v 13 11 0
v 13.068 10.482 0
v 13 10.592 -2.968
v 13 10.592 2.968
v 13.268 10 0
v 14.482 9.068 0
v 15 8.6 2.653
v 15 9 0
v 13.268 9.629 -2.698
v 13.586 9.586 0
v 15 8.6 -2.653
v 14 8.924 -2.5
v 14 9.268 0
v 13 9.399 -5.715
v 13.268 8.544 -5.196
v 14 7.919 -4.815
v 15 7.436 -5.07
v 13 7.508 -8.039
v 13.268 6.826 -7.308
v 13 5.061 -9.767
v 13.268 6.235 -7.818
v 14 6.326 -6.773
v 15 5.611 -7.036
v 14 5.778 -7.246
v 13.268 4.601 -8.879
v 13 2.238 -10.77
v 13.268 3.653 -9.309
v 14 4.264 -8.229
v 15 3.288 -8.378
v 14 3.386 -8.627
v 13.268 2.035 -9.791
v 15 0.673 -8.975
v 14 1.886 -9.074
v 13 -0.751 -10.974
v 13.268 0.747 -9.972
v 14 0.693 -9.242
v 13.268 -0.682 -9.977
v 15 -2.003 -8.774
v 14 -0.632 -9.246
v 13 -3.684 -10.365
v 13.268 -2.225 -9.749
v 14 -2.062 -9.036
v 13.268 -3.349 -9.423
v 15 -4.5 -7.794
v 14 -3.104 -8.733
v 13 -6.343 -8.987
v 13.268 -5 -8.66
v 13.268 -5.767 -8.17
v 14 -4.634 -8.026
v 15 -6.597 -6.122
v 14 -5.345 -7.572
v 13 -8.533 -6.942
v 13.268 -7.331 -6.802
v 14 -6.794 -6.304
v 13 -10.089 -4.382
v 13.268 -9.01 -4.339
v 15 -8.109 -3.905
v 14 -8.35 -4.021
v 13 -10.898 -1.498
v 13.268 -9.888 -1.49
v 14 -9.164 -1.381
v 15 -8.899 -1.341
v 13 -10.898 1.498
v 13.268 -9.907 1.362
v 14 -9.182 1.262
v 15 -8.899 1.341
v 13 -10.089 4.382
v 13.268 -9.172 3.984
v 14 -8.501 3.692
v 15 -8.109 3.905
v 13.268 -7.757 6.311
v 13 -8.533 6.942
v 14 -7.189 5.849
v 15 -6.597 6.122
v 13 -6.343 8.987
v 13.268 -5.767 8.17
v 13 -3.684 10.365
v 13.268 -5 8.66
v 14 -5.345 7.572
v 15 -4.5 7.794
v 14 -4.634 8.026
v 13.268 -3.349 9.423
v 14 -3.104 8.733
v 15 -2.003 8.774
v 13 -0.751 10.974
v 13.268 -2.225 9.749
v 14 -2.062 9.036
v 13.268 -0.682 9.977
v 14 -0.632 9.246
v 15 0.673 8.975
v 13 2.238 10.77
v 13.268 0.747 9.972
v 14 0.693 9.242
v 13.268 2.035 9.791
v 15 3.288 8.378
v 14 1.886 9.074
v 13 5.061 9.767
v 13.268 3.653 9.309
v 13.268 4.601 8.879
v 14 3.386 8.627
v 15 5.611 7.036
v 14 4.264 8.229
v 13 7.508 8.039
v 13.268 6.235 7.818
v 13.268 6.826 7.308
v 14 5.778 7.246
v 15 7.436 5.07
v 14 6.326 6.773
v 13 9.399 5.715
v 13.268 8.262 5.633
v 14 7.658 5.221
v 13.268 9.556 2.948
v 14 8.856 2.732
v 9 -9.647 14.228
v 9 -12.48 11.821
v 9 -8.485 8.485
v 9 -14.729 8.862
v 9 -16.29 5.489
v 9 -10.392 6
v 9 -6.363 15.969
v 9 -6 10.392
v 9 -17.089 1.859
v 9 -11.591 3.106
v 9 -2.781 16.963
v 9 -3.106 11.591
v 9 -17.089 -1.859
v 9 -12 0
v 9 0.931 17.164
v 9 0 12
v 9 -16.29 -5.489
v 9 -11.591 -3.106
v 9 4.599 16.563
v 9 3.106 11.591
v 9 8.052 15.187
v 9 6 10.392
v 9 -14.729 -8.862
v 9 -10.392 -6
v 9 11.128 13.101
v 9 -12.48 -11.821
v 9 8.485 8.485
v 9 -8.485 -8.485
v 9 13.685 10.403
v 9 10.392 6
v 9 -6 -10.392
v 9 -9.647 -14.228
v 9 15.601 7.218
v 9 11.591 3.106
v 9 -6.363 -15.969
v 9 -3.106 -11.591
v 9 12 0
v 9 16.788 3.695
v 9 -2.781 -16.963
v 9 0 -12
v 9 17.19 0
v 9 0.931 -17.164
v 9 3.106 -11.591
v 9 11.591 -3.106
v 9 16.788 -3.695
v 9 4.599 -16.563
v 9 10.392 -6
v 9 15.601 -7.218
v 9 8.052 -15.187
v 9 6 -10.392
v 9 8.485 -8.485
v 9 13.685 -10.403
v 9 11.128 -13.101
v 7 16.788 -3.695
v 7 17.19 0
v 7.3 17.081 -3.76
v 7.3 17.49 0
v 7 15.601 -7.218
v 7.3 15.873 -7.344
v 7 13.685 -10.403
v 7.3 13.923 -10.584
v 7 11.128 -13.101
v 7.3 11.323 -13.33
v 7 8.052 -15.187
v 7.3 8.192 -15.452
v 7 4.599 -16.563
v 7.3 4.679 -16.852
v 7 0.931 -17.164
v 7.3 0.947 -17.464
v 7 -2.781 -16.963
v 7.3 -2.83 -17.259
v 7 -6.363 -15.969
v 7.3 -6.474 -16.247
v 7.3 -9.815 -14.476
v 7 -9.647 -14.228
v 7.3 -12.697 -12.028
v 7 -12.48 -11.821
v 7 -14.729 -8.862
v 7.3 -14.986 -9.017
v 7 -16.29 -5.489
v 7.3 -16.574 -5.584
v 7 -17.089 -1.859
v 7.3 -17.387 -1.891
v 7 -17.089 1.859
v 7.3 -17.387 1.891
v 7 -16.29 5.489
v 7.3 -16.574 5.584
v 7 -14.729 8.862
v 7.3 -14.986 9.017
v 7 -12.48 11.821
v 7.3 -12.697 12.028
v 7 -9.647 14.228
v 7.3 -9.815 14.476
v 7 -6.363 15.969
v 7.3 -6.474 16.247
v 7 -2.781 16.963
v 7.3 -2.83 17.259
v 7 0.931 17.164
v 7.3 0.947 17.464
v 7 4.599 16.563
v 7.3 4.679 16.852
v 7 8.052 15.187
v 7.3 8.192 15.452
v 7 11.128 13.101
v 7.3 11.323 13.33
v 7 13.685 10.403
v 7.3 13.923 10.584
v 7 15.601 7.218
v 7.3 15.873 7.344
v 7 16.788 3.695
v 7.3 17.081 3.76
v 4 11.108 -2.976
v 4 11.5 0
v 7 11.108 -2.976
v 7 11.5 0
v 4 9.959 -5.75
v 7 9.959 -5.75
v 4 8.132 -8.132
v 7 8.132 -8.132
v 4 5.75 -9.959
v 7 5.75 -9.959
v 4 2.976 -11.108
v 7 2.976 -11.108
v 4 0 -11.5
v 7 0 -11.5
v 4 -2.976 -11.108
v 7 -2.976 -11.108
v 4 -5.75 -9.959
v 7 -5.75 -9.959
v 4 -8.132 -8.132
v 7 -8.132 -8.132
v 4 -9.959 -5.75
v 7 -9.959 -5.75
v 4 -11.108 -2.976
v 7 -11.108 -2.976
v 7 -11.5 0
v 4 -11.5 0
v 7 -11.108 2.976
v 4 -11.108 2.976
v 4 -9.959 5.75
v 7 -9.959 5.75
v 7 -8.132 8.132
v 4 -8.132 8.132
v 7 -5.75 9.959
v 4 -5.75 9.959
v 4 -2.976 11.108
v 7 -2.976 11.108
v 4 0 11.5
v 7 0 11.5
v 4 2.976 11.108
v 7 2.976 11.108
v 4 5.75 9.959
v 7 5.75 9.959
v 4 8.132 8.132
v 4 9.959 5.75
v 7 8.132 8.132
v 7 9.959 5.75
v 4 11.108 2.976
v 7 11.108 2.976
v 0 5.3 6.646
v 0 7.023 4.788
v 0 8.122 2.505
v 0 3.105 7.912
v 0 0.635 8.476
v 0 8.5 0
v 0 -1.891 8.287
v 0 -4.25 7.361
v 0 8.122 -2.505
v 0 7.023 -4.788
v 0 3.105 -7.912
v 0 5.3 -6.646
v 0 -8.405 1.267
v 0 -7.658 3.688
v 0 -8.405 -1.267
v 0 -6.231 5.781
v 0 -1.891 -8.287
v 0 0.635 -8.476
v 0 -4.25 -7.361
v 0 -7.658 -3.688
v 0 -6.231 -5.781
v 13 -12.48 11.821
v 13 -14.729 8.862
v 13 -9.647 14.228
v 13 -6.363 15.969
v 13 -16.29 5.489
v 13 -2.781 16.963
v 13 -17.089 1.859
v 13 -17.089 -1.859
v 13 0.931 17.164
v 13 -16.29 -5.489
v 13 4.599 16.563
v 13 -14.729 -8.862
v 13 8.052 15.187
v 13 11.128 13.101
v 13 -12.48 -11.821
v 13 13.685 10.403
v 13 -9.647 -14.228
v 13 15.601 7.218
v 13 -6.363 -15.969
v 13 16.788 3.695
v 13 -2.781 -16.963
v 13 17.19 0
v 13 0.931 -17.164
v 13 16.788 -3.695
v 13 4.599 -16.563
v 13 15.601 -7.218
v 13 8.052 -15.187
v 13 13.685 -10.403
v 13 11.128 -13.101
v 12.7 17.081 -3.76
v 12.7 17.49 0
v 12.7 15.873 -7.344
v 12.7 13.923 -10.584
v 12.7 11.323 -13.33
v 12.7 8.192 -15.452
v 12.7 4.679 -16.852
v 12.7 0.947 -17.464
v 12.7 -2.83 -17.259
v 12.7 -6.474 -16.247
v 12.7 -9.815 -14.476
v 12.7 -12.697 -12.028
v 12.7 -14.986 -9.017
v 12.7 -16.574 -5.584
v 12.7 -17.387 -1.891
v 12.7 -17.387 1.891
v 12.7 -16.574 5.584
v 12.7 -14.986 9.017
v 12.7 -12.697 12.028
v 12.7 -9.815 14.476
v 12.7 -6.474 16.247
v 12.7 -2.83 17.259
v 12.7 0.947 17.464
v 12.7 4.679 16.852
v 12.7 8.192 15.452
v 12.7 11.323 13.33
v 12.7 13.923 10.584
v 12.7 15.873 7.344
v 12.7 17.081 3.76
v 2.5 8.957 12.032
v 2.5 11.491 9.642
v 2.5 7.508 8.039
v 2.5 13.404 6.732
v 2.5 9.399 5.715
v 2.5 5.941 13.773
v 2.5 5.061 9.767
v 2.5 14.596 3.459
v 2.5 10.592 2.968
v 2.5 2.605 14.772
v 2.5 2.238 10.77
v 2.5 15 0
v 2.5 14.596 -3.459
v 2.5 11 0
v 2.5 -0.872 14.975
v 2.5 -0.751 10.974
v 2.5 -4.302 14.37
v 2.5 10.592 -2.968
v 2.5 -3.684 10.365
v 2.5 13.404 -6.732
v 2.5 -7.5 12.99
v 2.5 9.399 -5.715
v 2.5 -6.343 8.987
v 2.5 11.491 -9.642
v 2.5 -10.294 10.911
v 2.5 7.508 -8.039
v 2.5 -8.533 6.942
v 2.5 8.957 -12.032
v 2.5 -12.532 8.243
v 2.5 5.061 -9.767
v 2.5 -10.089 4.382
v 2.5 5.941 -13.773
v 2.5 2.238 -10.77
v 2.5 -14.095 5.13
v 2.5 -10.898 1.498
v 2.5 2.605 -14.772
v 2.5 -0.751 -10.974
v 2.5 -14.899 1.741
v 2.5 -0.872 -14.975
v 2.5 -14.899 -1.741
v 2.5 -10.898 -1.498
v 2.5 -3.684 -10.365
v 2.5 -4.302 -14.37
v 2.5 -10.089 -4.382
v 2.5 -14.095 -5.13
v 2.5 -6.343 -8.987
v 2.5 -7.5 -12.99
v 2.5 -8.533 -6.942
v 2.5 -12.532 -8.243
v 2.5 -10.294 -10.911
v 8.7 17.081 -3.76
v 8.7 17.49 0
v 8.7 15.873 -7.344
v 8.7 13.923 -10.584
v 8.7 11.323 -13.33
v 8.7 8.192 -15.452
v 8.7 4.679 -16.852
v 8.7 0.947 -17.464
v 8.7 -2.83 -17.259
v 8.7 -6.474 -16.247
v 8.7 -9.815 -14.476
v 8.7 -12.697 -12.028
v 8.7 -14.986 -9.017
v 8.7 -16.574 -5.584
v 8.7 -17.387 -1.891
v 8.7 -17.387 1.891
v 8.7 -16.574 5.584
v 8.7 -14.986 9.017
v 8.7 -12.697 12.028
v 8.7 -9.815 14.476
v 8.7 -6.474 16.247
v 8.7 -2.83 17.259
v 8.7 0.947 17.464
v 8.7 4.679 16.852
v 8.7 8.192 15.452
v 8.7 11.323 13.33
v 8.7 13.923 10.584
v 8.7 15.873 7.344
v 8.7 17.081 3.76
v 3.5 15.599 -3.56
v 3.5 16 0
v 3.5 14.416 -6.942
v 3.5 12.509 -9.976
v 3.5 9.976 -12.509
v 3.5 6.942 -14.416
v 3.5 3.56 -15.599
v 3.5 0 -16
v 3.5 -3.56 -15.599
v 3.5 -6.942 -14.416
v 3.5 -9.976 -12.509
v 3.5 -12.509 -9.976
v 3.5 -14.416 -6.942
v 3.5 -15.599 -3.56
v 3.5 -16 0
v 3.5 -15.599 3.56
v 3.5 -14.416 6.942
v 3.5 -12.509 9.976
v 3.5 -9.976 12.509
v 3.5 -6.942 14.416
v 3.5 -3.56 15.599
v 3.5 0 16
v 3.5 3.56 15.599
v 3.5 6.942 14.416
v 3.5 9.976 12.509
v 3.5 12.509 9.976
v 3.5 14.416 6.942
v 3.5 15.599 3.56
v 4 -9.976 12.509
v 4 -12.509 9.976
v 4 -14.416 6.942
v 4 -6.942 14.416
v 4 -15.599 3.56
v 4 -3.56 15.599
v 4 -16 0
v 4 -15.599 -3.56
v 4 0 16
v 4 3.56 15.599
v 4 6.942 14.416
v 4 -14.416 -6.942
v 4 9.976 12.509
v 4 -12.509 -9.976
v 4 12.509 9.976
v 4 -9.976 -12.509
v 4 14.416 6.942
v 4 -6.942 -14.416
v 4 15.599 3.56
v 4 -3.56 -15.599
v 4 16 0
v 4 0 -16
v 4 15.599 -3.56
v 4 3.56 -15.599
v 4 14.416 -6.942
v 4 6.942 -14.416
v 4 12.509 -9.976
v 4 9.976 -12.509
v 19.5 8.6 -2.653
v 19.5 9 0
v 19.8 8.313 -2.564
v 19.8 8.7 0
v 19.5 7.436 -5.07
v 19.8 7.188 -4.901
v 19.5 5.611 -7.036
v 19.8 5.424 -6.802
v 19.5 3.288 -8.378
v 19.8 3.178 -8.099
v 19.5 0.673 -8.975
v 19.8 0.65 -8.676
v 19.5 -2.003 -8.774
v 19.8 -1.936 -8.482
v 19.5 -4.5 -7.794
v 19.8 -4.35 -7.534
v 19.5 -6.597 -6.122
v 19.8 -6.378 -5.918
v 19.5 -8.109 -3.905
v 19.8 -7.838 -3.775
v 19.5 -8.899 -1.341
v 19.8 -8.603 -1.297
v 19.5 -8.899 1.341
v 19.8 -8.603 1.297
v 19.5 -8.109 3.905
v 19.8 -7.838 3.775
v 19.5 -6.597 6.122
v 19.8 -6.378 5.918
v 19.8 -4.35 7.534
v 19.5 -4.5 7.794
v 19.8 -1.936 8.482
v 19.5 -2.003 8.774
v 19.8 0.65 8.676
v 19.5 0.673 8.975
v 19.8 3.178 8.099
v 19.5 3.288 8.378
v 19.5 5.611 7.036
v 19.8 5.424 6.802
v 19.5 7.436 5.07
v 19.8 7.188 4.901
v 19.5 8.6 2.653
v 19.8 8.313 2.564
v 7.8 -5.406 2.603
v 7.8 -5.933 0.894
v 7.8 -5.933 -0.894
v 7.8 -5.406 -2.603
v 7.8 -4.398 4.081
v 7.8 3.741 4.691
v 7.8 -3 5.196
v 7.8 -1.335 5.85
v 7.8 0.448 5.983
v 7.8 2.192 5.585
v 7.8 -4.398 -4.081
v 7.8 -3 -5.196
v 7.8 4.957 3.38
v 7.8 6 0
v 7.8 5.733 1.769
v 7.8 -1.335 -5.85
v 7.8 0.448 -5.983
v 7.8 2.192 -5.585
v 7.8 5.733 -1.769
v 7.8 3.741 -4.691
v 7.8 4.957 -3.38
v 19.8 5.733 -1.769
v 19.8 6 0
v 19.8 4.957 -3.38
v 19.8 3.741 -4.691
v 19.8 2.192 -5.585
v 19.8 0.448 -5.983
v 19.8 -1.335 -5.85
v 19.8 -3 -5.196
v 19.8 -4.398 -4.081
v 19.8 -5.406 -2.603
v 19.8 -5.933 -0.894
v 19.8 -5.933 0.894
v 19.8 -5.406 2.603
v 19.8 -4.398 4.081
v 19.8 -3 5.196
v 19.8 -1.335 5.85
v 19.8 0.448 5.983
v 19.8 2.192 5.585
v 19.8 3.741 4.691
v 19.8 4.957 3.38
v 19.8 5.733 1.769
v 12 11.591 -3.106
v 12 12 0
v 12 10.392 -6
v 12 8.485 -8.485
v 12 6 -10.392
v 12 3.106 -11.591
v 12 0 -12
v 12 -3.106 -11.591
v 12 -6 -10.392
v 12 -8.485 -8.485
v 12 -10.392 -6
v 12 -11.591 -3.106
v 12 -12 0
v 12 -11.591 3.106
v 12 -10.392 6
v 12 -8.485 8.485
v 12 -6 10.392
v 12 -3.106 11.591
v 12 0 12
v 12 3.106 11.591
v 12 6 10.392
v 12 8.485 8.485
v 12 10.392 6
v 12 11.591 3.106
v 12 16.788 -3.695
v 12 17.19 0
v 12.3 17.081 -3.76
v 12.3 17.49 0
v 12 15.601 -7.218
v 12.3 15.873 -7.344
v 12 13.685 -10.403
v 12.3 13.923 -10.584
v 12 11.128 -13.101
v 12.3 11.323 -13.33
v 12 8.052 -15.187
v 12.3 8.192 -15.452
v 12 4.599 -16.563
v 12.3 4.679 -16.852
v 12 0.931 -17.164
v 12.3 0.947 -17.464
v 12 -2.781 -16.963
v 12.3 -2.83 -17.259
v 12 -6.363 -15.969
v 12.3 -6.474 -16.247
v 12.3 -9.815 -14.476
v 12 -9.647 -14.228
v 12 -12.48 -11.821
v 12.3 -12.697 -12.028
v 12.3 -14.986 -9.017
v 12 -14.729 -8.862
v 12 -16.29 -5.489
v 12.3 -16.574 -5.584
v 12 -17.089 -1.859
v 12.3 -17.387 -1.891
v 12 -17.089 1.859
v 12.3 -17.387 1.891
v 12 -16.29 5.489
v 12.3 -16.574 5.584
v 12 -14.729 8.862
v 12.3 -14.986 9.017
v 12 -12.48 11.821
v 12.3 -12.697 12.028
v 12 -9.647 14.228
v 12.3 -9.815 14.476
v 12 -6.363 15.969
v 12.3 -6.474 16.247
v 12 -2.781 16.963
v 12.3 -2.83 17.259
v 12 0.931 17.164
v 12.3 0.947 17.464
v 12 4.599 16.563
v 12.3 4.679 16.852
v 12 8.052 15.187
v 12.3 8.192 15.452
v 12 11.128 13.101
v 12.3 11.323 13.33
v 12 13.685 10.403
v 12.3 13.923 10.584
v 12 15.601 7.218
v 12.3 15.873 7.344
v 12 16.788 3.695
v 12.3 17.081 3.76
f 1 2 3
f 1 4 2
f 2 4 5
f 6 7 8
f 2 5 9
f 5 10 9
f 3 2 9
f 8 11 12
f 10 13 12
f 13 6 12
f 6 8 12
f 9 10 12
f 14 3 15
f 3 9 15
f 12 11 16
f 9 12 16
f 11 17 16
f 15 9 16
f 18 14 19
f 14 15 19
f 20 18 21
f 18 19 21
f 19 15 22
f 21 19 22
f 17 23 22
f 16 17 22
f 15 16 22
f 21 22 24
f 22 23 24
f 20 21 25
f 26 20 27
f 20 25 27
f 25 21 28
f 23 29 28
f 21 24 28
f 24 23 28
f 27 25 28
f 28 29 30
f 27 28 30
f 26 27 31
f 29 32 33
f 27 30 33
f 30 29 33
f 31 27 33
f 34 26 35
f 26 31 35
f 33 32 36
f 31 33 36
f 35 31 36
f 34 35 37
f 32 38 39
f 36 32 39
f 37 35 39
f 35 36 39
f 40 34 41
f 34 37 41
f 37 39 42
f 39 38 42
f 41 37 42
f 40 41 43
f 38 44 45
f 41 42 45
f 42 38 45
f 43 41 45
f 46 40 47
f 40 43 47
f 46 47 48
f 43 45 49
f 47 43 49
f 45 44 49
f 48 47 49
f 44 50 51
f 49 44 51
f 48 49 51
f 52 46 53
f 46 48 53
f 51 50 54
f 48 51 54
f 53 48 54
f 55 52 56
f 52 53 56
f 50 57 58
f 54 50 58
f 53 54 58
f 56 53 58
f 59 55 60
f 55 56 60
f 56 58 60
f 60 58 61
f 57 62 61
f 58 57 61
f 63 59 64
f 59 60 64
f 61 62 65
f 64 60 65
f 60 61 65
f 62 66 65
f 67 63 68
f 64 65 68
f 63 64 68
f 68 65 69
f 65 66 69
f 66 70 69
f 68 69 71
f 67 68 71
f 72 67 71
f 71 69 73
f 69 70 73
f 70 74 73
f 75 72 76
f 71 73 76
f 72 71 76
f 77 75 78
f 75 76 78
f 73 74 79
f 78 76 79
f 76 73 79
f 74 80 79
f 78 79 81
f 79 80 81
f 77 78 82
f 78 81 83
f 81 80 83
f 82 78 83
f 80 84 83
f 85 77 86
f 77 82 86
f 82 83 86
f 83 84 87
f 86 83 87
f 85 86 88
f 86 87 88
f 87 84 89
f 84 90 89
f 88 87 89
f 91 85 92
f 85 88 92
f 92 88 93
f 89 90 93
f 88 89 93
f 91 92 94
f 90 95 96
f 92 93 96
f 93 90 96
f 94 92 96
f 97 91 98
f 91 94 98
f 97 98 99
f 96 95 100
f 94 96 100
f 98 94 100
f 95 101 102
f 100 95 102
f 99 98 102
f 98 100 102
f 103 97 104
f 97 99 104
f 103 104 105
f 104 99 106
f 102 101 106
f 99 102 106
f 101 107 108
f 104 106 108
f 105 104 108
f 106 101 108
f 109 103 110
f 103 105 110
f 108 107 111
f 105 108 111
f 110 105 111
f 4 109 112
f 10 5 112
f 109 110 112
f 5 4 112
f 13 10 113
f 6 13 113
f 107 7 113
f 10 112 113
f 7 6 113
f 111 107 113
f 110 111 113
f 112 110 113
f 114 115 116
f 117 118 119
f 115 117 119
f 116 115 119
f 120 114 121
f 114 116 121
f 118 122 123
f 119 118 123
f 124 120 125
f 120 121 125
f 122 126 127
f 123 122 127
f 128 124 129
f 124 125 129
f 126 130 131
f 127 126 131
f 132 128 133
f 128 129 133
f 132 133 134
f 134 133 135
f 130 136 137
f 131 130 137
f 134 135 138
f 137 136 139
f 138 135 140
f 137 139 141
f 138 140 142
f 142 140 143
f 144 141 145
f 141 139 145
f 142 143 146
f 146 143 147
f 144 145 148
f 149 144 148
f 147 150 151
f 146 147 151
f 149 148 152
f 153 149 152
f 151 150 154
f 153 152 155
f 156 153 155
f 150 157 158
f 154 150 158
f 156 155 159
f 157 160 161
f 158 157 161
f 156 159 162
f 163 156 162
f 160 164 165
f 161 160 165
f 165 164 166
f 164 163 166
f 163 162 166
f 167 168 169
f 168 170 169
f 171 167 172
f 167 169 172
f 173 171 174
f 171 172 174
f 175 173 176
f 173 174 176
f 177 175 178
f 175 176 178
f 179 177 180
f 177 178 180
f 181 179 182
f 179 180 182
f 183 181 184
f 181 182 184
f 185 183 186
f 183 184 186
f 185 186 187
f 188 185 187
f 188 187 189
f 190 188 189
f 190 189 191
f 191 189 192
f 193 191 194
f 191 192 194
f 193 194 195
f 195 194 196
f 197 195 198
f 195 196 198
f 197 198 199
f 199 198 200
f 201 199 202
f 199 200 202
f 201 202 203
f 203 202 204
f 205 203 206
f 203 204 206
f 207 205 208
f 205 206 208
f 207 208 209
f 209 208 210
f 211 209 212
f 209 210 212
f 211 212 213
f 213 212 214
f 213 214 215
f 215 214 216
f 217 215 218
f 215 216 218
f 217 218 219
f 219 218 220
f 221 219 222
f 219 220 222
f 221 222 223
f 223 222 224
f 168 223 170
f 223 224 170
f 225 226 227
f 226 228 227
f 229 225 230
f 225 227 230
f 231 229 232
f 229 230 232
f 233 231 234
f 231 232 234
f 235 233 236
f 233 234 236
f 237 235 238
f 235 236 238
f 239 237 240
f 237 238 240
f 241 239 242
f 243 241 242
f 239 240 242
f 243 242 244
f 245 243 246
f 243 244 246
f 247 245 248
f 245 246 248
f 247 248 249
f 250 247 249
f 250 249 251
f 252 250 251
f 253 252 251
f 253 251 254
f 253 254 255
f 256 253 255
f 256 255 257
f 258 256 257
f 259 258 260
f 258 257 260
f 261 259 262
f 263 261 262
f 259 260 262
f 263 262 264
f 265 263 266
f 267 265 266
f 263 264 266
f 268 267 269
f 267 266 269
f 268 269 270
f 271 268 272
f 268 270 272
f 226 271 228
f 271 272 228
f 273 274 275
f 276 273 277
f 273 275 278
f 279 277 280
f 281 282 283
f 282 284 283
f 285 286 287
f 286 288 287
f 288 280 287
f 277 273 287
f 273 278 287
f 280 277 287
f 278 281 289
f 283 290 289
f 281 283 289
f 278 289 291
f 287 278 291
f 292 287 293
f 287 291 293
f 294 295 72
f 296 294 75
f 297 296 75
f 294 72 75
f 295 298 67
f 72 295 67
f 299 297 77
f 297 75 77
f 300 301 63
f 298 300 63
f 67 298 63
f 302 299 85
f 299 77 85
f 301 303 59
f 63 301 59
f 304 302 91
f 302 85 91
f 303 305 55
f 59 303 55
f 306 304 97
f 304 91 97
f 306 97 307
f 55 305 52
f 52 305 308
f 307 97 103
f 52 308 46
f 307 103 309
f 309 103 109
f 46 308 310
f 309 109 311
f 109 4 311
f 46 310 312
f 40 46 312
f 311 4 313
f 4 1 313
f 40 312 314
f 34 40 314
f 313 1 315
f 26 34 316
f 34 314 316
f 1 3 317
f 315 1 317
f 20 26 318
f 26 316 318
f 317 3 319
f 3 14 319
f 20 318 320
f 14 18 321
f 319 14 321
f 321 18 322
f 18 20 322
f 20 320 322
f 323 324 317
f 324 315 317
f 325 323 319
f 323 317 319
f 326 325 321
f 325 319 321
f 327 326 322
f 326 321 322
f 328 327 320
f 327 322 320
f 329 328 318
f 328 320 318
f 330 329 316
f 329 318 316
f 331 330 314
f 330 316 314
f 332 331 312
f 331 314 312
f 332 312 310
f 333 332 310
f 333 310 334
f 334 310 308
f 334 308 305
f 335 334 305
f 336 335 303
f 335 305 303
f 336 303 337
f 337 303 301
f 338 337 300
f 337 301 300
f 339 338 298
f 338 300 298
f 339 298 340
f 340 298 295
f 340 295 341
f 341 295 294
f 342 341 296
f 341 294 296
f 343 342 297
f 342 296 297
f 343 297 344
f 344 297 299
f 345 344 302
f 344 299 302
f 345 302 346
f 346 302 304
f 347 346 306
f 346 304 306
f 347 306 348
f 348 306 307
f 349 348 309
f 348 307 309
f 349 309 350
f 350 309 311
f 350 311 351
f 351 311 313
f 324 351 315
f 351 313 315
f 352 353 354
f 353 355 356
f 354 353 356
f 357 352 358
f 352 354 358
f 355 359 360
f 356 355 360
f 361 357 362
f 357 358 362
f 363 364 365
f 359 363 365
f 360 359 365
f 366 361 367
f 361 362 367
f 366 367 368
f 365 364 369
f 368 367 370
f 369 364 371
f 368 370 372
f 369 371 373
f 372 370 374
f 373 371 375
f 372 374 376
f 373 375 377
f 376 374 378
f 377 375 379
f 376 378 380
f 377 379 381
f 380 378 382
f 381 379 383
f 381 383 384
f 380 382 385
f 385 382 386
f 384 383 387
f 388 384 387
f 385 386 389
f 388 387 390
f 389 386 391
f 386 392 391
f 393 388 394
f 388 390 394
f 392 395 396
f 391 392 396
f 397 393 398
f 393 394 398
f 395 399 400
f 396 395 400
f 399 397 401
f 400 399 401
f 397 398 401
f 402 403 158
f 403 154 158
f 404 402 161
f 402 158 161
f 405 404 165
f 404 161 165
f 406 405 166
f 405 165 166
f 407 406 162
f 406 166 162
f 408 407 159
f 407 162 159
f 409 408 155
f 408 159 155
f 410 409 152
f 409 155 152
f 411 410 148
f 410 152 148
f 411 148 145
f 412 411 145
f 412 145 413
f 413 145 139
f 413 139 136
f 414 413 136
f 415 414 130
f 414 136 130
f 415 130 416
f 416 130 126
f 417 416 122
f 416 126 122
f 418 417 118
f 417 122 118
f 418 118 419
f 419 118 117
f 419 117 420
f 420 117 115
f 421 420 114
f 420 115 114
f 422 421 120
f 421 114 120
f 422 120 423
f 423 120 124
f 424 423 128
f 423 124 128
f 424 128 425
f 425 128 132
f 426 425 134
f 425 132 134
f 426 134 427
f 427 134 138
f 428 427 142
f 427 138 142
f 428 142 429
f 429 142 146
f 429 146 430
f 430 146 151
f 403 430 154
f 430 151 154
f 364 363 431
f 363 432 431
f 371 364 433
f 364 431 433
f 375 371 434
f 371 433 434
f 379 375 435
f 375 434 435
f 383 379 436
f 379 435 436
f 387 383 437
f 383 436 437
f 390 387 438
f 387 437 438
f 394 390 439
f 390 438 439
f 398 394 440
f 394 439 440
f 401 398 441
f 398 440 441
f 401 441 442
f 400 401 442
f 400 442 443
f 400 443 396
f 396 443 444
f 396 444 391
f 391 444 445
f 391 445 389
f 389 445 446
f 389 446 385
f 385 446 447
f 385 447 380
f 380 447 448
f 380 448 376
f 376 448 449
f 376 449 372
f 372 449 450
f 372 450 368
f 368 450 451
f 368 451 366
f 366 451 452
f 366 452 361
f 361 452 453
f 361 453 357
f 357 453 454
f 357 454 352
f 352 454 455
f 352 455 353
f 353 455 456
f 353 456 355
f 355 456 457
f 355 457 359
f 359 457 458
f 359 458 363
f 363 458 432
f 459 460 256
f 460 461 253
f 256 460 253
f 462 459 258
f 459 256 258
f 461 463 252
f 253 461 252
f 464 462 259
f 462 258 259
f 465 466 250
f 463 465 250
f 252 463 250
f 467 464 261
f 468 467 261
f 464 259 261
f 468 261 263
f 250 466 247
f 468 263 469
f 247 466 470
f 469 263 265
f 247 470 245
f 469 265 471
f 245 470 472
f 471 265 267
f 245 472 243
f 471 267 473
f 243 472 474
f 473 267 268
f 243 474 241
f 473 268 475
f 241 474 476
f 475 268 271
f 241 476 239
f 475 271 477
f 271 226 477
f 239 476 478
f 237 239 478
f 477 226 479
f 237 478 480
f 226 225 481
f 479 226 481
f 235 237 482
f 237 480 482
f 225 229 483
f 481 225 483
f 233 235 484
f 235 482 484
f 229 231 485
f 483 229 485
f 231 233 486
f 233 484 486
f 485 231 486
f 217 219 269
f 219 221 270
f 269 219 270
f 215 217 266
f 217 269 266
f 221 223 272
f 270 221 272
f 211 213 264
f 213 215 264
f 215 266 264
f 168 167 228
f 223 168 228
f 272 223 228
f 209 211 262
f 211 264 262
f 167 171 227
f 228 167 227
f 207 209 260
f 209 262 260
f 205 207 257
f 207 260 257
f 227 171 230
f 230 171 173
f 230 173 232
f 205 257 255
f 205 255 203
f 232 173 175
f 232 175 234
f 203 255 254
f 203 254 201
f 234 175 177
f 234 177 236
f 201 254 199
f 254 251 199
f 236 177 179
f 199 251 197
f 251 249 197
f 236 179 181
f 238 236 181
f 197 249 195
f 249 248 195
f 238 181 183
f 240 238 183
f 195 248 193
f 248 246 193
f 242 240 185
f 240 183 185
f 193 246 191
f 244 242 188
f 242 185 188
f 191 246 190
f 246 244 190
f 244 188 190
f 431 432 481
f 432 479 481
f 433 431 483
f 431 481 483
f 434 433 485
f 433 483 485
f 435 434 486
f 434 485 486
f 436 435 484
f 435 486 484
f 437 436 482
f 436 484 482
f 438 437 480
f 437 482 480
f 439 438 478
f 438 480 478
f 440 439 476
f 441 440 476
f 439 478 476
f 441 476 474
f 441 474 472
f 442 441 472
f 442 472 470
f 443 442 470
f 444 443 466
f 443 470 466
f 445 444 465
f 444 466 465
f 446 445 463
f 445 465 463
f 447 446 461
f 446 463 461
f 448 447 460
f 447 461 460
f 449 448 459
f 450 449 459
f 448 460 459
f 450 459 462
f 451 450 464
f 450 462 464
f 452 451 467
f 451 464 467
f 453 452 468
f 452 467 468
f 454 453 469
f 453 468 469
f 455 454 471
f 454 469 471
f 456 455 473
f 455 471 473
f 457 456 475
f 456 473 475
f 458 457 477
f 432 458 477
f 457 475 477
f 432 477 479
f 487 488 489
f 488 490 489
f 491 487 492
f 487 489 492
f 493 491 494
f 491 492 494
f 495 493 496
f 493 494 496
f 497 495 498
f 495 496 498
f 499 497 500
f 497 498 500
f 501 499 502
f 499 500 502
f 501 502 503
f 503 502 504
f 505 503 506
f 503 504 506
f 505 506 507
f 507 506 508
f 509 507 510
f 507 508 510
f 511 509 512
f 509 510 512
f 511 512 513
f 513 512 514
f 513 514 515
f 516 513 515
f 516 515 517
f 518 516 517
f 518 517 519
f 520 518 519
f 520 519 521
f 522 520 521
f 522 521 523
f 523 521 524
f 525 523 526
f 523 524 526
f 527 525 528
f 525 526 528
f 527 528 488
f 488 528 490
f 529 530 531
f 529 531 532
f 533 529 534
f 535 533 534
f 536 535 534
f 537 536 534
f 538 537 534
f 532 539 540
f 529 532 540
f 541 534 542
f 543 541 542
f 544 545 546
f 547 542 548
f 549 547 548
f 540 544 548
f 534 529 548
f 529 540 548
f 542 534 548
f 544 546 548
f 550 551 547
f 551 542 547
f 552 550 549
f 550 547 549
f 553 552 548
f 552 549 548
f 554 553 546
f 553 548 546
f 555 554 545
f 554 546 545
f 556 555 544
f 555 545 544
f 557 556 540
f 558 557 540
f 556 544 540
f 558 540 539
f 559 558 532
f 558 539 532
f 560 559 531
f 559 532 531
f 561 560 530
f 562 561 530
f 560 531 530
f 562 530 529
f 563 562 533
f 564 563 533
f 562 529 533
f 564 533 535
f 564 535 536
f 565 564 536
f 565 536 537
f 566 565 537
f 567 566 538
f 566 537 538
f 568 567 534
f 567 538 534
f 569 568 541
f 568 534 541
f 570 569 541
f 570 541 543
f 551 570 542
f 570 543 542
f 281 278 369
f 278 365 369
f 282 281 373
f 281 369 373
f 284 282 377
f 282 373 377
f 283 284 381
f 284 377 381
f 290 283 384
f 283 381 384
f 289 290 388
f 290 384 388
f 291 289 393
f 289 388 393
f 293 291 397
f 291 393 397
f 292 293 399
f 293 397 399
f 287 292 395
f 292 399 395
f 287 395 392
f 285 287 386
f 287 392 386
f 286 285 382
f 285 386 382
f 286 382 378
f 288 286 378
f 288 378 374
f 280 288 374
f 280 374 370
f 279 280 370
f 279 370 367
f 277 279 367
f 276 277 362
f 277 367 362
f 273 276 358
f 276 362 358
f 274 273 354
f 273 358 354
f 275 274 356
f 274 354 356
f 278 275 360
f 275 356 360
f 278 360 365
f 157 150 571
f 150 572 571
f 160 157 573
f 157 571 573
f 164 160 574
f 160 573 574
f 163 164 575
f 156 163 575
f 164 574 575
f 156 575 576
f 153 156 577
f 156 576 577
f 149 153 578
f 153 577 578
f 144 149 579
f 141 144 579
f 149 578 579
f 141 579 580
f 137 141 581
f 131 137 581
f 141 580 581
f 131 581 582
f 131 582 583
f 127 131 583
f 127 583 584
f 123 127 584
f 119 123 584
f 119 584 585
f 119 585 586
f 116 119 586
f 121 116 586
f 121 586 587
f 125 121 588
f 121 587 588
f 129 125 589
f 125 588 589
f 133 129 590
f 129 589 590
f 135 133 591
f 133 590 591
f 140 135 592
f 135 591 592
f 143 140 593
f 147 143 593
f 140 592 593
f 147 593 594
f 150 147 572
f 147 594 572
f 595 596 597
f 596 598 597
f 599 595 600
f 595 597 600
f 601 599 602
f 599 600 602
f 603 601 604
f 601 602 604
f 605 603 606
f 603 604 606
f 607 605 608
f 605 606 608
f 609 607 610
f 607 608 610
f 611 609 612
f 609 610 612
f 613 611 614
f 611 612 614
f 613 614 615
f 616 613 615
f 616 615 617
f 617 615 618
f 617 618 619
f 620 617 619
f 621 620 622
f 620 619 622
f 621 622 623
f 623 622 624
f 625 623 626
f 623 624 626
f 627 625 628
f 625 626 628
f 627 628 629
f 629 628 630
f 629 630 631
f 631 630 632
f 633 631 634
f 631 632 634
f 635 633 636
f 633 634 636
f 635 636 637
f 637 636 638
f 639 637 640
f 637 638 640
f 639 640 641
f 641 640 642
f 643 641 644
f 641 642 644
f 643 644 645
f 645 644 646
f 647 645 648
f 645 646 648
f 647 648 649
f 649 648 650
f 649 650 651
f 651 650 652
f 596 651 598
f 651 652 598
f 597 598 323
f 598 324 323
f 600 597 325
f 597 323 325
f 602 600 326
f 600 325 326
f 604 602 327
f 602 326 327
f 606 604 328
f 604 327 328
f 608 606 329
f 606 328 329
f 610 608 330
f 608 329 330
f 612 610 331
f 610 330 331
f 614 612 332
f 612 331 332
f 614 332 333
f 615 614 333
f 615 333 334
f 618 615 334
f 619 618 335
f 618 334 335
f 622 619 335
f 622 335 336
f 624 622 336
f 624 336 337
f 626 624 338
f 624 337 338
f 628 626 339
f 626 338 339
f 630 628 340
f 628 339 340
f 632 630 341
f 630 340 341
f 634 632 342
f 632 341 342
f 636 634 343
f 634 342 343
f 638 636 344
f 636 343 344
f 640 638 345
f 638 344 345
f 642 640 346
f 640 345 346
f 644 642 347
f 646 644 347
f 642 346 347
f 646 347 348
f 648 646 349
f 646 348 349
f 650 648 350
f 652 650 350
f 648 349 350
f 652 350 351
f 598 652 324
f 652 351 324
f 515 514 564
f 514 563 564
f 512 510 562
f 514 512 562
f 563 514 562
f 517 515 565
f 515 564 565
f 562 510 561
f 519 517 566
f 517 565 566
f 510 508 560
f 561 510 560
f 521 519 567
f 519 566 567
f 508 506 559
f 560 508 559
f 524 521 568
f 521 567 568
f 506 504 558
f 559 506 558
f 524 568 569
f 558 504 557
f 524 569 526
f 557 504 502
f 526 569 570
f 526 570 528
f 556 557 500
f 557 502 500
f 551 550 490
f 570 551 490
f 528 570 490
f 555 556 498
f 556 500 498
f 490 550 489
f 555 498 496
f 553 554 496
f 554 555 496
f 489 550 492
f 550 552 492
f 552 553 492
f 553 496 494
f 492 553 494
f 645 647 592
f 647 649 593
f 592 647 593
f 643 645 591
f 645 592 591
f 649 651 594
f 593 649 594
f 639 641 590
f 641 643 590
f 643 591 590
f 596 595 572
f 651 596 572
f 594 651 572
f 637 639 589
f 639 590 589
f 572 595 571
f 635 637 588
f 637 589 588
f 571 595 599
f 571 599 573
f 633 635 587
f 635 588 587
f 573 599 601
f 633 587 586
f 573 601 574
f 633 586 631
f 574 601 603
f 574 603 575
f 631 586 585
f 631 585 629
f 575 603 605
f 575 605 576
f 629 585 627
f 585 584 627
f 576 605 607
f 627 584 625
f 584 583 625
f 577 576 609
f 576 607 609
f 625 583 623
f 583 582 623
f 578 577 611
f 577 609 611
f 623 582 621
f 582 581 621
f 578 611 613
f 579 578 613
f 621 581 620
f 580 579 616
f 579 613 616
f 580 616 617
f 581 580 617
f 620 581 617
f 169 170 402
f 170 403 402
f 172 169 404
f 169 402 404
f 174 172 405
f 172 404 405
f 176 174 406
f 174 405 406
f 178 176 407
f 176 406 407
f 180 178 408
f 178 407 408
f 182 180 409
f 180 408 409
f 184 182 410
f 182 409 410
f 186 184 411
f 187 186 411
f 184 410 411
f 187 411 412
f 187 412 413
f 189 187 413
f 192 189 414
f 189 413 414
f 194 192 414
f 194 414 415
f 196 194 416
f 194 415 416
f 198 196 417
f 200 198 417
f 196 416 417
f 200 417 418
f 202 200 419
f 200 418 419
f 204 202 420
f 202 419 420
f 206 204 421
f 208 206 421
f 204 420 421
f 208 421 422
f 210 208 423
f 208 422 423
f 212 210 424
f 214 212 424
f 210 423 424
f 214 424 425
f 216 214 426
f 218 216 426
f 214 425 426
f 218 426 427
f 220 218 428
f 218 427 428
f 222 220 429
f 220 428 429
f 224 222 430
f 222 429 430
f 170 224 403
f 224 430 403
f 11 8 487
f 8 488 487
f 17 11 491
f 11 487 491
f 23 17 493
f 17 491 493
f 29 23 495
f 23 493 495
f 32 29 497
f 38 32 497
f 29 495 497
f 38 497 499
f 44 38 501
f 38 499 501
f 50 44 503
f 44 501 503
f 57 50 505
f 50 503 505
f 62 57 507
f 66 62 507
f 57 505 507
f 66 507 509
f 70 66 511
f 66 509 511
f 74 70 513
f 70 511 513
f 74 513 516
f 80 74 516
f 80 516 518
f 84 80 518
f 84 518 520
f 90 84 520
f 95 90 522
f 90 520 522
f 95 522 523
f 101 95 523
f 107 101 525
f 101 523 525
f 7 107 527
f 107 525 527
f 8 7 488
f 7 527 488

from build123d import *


with BuildPart() as part:
    # Esquisse1 → Révolution1 (revolve)
    with BuildSketch(Plane.XY):
        with BuildLine():
            Line((0, 0), (0, 8.5))
            Line((0, 8.5), (2.5, 11))
            Line((2.5, 11), (2.5, 15))
            Line((2.5, 15), (3.5, 16))
            Line((3.5, 16), (4, 16))
            Line((4, 16), (4, 12.826466888))
            Line((4, 12.826466888), (4, 11.5))
            Line((4, 11.5), (7, 11.5))
            Line((7, 11.5), (7, 17.18964629))
            Line((7, 17.18964629), (7.3, 17.48964629))
            Line((7.3, 17.48964629), (8.7, 17.48964629))
            Line((8.7, 17.48964629), (9, 17.18964629))
            Line((9, 17.18964629), (9, 12))
            Line((9, 12), (12, 12))
            Line((12, 12), (12, 17.18964629))
            Line((12, 17.18964629), (12.3, 17.48964629))
            Line((12.3, 17.48964629), (12.7, 17.48964629))
            Line((12.7, 17.48964629), (13, 17.18964629))
            Line((13, 17.18964629), (13, 11))
            ThreePointArc((13, 11), (13.585786438, 9.585786438), (15, 9))
            Line((15, 9), (19.5, 9))
            Line((19.5, 9), (19.8, 8.7))
            Line((19.8, 8.7), (19.8, 6))
            Line((19.8, 6), (7.8, 6))
            Line((7.8, 6), (7.8, 0))
            Line((7.8, 0), (0, 0))
        make_face()
    revolve(axis=Axis((7.8, 0, 0), (-1, 0, 0)))


solid = part.part
